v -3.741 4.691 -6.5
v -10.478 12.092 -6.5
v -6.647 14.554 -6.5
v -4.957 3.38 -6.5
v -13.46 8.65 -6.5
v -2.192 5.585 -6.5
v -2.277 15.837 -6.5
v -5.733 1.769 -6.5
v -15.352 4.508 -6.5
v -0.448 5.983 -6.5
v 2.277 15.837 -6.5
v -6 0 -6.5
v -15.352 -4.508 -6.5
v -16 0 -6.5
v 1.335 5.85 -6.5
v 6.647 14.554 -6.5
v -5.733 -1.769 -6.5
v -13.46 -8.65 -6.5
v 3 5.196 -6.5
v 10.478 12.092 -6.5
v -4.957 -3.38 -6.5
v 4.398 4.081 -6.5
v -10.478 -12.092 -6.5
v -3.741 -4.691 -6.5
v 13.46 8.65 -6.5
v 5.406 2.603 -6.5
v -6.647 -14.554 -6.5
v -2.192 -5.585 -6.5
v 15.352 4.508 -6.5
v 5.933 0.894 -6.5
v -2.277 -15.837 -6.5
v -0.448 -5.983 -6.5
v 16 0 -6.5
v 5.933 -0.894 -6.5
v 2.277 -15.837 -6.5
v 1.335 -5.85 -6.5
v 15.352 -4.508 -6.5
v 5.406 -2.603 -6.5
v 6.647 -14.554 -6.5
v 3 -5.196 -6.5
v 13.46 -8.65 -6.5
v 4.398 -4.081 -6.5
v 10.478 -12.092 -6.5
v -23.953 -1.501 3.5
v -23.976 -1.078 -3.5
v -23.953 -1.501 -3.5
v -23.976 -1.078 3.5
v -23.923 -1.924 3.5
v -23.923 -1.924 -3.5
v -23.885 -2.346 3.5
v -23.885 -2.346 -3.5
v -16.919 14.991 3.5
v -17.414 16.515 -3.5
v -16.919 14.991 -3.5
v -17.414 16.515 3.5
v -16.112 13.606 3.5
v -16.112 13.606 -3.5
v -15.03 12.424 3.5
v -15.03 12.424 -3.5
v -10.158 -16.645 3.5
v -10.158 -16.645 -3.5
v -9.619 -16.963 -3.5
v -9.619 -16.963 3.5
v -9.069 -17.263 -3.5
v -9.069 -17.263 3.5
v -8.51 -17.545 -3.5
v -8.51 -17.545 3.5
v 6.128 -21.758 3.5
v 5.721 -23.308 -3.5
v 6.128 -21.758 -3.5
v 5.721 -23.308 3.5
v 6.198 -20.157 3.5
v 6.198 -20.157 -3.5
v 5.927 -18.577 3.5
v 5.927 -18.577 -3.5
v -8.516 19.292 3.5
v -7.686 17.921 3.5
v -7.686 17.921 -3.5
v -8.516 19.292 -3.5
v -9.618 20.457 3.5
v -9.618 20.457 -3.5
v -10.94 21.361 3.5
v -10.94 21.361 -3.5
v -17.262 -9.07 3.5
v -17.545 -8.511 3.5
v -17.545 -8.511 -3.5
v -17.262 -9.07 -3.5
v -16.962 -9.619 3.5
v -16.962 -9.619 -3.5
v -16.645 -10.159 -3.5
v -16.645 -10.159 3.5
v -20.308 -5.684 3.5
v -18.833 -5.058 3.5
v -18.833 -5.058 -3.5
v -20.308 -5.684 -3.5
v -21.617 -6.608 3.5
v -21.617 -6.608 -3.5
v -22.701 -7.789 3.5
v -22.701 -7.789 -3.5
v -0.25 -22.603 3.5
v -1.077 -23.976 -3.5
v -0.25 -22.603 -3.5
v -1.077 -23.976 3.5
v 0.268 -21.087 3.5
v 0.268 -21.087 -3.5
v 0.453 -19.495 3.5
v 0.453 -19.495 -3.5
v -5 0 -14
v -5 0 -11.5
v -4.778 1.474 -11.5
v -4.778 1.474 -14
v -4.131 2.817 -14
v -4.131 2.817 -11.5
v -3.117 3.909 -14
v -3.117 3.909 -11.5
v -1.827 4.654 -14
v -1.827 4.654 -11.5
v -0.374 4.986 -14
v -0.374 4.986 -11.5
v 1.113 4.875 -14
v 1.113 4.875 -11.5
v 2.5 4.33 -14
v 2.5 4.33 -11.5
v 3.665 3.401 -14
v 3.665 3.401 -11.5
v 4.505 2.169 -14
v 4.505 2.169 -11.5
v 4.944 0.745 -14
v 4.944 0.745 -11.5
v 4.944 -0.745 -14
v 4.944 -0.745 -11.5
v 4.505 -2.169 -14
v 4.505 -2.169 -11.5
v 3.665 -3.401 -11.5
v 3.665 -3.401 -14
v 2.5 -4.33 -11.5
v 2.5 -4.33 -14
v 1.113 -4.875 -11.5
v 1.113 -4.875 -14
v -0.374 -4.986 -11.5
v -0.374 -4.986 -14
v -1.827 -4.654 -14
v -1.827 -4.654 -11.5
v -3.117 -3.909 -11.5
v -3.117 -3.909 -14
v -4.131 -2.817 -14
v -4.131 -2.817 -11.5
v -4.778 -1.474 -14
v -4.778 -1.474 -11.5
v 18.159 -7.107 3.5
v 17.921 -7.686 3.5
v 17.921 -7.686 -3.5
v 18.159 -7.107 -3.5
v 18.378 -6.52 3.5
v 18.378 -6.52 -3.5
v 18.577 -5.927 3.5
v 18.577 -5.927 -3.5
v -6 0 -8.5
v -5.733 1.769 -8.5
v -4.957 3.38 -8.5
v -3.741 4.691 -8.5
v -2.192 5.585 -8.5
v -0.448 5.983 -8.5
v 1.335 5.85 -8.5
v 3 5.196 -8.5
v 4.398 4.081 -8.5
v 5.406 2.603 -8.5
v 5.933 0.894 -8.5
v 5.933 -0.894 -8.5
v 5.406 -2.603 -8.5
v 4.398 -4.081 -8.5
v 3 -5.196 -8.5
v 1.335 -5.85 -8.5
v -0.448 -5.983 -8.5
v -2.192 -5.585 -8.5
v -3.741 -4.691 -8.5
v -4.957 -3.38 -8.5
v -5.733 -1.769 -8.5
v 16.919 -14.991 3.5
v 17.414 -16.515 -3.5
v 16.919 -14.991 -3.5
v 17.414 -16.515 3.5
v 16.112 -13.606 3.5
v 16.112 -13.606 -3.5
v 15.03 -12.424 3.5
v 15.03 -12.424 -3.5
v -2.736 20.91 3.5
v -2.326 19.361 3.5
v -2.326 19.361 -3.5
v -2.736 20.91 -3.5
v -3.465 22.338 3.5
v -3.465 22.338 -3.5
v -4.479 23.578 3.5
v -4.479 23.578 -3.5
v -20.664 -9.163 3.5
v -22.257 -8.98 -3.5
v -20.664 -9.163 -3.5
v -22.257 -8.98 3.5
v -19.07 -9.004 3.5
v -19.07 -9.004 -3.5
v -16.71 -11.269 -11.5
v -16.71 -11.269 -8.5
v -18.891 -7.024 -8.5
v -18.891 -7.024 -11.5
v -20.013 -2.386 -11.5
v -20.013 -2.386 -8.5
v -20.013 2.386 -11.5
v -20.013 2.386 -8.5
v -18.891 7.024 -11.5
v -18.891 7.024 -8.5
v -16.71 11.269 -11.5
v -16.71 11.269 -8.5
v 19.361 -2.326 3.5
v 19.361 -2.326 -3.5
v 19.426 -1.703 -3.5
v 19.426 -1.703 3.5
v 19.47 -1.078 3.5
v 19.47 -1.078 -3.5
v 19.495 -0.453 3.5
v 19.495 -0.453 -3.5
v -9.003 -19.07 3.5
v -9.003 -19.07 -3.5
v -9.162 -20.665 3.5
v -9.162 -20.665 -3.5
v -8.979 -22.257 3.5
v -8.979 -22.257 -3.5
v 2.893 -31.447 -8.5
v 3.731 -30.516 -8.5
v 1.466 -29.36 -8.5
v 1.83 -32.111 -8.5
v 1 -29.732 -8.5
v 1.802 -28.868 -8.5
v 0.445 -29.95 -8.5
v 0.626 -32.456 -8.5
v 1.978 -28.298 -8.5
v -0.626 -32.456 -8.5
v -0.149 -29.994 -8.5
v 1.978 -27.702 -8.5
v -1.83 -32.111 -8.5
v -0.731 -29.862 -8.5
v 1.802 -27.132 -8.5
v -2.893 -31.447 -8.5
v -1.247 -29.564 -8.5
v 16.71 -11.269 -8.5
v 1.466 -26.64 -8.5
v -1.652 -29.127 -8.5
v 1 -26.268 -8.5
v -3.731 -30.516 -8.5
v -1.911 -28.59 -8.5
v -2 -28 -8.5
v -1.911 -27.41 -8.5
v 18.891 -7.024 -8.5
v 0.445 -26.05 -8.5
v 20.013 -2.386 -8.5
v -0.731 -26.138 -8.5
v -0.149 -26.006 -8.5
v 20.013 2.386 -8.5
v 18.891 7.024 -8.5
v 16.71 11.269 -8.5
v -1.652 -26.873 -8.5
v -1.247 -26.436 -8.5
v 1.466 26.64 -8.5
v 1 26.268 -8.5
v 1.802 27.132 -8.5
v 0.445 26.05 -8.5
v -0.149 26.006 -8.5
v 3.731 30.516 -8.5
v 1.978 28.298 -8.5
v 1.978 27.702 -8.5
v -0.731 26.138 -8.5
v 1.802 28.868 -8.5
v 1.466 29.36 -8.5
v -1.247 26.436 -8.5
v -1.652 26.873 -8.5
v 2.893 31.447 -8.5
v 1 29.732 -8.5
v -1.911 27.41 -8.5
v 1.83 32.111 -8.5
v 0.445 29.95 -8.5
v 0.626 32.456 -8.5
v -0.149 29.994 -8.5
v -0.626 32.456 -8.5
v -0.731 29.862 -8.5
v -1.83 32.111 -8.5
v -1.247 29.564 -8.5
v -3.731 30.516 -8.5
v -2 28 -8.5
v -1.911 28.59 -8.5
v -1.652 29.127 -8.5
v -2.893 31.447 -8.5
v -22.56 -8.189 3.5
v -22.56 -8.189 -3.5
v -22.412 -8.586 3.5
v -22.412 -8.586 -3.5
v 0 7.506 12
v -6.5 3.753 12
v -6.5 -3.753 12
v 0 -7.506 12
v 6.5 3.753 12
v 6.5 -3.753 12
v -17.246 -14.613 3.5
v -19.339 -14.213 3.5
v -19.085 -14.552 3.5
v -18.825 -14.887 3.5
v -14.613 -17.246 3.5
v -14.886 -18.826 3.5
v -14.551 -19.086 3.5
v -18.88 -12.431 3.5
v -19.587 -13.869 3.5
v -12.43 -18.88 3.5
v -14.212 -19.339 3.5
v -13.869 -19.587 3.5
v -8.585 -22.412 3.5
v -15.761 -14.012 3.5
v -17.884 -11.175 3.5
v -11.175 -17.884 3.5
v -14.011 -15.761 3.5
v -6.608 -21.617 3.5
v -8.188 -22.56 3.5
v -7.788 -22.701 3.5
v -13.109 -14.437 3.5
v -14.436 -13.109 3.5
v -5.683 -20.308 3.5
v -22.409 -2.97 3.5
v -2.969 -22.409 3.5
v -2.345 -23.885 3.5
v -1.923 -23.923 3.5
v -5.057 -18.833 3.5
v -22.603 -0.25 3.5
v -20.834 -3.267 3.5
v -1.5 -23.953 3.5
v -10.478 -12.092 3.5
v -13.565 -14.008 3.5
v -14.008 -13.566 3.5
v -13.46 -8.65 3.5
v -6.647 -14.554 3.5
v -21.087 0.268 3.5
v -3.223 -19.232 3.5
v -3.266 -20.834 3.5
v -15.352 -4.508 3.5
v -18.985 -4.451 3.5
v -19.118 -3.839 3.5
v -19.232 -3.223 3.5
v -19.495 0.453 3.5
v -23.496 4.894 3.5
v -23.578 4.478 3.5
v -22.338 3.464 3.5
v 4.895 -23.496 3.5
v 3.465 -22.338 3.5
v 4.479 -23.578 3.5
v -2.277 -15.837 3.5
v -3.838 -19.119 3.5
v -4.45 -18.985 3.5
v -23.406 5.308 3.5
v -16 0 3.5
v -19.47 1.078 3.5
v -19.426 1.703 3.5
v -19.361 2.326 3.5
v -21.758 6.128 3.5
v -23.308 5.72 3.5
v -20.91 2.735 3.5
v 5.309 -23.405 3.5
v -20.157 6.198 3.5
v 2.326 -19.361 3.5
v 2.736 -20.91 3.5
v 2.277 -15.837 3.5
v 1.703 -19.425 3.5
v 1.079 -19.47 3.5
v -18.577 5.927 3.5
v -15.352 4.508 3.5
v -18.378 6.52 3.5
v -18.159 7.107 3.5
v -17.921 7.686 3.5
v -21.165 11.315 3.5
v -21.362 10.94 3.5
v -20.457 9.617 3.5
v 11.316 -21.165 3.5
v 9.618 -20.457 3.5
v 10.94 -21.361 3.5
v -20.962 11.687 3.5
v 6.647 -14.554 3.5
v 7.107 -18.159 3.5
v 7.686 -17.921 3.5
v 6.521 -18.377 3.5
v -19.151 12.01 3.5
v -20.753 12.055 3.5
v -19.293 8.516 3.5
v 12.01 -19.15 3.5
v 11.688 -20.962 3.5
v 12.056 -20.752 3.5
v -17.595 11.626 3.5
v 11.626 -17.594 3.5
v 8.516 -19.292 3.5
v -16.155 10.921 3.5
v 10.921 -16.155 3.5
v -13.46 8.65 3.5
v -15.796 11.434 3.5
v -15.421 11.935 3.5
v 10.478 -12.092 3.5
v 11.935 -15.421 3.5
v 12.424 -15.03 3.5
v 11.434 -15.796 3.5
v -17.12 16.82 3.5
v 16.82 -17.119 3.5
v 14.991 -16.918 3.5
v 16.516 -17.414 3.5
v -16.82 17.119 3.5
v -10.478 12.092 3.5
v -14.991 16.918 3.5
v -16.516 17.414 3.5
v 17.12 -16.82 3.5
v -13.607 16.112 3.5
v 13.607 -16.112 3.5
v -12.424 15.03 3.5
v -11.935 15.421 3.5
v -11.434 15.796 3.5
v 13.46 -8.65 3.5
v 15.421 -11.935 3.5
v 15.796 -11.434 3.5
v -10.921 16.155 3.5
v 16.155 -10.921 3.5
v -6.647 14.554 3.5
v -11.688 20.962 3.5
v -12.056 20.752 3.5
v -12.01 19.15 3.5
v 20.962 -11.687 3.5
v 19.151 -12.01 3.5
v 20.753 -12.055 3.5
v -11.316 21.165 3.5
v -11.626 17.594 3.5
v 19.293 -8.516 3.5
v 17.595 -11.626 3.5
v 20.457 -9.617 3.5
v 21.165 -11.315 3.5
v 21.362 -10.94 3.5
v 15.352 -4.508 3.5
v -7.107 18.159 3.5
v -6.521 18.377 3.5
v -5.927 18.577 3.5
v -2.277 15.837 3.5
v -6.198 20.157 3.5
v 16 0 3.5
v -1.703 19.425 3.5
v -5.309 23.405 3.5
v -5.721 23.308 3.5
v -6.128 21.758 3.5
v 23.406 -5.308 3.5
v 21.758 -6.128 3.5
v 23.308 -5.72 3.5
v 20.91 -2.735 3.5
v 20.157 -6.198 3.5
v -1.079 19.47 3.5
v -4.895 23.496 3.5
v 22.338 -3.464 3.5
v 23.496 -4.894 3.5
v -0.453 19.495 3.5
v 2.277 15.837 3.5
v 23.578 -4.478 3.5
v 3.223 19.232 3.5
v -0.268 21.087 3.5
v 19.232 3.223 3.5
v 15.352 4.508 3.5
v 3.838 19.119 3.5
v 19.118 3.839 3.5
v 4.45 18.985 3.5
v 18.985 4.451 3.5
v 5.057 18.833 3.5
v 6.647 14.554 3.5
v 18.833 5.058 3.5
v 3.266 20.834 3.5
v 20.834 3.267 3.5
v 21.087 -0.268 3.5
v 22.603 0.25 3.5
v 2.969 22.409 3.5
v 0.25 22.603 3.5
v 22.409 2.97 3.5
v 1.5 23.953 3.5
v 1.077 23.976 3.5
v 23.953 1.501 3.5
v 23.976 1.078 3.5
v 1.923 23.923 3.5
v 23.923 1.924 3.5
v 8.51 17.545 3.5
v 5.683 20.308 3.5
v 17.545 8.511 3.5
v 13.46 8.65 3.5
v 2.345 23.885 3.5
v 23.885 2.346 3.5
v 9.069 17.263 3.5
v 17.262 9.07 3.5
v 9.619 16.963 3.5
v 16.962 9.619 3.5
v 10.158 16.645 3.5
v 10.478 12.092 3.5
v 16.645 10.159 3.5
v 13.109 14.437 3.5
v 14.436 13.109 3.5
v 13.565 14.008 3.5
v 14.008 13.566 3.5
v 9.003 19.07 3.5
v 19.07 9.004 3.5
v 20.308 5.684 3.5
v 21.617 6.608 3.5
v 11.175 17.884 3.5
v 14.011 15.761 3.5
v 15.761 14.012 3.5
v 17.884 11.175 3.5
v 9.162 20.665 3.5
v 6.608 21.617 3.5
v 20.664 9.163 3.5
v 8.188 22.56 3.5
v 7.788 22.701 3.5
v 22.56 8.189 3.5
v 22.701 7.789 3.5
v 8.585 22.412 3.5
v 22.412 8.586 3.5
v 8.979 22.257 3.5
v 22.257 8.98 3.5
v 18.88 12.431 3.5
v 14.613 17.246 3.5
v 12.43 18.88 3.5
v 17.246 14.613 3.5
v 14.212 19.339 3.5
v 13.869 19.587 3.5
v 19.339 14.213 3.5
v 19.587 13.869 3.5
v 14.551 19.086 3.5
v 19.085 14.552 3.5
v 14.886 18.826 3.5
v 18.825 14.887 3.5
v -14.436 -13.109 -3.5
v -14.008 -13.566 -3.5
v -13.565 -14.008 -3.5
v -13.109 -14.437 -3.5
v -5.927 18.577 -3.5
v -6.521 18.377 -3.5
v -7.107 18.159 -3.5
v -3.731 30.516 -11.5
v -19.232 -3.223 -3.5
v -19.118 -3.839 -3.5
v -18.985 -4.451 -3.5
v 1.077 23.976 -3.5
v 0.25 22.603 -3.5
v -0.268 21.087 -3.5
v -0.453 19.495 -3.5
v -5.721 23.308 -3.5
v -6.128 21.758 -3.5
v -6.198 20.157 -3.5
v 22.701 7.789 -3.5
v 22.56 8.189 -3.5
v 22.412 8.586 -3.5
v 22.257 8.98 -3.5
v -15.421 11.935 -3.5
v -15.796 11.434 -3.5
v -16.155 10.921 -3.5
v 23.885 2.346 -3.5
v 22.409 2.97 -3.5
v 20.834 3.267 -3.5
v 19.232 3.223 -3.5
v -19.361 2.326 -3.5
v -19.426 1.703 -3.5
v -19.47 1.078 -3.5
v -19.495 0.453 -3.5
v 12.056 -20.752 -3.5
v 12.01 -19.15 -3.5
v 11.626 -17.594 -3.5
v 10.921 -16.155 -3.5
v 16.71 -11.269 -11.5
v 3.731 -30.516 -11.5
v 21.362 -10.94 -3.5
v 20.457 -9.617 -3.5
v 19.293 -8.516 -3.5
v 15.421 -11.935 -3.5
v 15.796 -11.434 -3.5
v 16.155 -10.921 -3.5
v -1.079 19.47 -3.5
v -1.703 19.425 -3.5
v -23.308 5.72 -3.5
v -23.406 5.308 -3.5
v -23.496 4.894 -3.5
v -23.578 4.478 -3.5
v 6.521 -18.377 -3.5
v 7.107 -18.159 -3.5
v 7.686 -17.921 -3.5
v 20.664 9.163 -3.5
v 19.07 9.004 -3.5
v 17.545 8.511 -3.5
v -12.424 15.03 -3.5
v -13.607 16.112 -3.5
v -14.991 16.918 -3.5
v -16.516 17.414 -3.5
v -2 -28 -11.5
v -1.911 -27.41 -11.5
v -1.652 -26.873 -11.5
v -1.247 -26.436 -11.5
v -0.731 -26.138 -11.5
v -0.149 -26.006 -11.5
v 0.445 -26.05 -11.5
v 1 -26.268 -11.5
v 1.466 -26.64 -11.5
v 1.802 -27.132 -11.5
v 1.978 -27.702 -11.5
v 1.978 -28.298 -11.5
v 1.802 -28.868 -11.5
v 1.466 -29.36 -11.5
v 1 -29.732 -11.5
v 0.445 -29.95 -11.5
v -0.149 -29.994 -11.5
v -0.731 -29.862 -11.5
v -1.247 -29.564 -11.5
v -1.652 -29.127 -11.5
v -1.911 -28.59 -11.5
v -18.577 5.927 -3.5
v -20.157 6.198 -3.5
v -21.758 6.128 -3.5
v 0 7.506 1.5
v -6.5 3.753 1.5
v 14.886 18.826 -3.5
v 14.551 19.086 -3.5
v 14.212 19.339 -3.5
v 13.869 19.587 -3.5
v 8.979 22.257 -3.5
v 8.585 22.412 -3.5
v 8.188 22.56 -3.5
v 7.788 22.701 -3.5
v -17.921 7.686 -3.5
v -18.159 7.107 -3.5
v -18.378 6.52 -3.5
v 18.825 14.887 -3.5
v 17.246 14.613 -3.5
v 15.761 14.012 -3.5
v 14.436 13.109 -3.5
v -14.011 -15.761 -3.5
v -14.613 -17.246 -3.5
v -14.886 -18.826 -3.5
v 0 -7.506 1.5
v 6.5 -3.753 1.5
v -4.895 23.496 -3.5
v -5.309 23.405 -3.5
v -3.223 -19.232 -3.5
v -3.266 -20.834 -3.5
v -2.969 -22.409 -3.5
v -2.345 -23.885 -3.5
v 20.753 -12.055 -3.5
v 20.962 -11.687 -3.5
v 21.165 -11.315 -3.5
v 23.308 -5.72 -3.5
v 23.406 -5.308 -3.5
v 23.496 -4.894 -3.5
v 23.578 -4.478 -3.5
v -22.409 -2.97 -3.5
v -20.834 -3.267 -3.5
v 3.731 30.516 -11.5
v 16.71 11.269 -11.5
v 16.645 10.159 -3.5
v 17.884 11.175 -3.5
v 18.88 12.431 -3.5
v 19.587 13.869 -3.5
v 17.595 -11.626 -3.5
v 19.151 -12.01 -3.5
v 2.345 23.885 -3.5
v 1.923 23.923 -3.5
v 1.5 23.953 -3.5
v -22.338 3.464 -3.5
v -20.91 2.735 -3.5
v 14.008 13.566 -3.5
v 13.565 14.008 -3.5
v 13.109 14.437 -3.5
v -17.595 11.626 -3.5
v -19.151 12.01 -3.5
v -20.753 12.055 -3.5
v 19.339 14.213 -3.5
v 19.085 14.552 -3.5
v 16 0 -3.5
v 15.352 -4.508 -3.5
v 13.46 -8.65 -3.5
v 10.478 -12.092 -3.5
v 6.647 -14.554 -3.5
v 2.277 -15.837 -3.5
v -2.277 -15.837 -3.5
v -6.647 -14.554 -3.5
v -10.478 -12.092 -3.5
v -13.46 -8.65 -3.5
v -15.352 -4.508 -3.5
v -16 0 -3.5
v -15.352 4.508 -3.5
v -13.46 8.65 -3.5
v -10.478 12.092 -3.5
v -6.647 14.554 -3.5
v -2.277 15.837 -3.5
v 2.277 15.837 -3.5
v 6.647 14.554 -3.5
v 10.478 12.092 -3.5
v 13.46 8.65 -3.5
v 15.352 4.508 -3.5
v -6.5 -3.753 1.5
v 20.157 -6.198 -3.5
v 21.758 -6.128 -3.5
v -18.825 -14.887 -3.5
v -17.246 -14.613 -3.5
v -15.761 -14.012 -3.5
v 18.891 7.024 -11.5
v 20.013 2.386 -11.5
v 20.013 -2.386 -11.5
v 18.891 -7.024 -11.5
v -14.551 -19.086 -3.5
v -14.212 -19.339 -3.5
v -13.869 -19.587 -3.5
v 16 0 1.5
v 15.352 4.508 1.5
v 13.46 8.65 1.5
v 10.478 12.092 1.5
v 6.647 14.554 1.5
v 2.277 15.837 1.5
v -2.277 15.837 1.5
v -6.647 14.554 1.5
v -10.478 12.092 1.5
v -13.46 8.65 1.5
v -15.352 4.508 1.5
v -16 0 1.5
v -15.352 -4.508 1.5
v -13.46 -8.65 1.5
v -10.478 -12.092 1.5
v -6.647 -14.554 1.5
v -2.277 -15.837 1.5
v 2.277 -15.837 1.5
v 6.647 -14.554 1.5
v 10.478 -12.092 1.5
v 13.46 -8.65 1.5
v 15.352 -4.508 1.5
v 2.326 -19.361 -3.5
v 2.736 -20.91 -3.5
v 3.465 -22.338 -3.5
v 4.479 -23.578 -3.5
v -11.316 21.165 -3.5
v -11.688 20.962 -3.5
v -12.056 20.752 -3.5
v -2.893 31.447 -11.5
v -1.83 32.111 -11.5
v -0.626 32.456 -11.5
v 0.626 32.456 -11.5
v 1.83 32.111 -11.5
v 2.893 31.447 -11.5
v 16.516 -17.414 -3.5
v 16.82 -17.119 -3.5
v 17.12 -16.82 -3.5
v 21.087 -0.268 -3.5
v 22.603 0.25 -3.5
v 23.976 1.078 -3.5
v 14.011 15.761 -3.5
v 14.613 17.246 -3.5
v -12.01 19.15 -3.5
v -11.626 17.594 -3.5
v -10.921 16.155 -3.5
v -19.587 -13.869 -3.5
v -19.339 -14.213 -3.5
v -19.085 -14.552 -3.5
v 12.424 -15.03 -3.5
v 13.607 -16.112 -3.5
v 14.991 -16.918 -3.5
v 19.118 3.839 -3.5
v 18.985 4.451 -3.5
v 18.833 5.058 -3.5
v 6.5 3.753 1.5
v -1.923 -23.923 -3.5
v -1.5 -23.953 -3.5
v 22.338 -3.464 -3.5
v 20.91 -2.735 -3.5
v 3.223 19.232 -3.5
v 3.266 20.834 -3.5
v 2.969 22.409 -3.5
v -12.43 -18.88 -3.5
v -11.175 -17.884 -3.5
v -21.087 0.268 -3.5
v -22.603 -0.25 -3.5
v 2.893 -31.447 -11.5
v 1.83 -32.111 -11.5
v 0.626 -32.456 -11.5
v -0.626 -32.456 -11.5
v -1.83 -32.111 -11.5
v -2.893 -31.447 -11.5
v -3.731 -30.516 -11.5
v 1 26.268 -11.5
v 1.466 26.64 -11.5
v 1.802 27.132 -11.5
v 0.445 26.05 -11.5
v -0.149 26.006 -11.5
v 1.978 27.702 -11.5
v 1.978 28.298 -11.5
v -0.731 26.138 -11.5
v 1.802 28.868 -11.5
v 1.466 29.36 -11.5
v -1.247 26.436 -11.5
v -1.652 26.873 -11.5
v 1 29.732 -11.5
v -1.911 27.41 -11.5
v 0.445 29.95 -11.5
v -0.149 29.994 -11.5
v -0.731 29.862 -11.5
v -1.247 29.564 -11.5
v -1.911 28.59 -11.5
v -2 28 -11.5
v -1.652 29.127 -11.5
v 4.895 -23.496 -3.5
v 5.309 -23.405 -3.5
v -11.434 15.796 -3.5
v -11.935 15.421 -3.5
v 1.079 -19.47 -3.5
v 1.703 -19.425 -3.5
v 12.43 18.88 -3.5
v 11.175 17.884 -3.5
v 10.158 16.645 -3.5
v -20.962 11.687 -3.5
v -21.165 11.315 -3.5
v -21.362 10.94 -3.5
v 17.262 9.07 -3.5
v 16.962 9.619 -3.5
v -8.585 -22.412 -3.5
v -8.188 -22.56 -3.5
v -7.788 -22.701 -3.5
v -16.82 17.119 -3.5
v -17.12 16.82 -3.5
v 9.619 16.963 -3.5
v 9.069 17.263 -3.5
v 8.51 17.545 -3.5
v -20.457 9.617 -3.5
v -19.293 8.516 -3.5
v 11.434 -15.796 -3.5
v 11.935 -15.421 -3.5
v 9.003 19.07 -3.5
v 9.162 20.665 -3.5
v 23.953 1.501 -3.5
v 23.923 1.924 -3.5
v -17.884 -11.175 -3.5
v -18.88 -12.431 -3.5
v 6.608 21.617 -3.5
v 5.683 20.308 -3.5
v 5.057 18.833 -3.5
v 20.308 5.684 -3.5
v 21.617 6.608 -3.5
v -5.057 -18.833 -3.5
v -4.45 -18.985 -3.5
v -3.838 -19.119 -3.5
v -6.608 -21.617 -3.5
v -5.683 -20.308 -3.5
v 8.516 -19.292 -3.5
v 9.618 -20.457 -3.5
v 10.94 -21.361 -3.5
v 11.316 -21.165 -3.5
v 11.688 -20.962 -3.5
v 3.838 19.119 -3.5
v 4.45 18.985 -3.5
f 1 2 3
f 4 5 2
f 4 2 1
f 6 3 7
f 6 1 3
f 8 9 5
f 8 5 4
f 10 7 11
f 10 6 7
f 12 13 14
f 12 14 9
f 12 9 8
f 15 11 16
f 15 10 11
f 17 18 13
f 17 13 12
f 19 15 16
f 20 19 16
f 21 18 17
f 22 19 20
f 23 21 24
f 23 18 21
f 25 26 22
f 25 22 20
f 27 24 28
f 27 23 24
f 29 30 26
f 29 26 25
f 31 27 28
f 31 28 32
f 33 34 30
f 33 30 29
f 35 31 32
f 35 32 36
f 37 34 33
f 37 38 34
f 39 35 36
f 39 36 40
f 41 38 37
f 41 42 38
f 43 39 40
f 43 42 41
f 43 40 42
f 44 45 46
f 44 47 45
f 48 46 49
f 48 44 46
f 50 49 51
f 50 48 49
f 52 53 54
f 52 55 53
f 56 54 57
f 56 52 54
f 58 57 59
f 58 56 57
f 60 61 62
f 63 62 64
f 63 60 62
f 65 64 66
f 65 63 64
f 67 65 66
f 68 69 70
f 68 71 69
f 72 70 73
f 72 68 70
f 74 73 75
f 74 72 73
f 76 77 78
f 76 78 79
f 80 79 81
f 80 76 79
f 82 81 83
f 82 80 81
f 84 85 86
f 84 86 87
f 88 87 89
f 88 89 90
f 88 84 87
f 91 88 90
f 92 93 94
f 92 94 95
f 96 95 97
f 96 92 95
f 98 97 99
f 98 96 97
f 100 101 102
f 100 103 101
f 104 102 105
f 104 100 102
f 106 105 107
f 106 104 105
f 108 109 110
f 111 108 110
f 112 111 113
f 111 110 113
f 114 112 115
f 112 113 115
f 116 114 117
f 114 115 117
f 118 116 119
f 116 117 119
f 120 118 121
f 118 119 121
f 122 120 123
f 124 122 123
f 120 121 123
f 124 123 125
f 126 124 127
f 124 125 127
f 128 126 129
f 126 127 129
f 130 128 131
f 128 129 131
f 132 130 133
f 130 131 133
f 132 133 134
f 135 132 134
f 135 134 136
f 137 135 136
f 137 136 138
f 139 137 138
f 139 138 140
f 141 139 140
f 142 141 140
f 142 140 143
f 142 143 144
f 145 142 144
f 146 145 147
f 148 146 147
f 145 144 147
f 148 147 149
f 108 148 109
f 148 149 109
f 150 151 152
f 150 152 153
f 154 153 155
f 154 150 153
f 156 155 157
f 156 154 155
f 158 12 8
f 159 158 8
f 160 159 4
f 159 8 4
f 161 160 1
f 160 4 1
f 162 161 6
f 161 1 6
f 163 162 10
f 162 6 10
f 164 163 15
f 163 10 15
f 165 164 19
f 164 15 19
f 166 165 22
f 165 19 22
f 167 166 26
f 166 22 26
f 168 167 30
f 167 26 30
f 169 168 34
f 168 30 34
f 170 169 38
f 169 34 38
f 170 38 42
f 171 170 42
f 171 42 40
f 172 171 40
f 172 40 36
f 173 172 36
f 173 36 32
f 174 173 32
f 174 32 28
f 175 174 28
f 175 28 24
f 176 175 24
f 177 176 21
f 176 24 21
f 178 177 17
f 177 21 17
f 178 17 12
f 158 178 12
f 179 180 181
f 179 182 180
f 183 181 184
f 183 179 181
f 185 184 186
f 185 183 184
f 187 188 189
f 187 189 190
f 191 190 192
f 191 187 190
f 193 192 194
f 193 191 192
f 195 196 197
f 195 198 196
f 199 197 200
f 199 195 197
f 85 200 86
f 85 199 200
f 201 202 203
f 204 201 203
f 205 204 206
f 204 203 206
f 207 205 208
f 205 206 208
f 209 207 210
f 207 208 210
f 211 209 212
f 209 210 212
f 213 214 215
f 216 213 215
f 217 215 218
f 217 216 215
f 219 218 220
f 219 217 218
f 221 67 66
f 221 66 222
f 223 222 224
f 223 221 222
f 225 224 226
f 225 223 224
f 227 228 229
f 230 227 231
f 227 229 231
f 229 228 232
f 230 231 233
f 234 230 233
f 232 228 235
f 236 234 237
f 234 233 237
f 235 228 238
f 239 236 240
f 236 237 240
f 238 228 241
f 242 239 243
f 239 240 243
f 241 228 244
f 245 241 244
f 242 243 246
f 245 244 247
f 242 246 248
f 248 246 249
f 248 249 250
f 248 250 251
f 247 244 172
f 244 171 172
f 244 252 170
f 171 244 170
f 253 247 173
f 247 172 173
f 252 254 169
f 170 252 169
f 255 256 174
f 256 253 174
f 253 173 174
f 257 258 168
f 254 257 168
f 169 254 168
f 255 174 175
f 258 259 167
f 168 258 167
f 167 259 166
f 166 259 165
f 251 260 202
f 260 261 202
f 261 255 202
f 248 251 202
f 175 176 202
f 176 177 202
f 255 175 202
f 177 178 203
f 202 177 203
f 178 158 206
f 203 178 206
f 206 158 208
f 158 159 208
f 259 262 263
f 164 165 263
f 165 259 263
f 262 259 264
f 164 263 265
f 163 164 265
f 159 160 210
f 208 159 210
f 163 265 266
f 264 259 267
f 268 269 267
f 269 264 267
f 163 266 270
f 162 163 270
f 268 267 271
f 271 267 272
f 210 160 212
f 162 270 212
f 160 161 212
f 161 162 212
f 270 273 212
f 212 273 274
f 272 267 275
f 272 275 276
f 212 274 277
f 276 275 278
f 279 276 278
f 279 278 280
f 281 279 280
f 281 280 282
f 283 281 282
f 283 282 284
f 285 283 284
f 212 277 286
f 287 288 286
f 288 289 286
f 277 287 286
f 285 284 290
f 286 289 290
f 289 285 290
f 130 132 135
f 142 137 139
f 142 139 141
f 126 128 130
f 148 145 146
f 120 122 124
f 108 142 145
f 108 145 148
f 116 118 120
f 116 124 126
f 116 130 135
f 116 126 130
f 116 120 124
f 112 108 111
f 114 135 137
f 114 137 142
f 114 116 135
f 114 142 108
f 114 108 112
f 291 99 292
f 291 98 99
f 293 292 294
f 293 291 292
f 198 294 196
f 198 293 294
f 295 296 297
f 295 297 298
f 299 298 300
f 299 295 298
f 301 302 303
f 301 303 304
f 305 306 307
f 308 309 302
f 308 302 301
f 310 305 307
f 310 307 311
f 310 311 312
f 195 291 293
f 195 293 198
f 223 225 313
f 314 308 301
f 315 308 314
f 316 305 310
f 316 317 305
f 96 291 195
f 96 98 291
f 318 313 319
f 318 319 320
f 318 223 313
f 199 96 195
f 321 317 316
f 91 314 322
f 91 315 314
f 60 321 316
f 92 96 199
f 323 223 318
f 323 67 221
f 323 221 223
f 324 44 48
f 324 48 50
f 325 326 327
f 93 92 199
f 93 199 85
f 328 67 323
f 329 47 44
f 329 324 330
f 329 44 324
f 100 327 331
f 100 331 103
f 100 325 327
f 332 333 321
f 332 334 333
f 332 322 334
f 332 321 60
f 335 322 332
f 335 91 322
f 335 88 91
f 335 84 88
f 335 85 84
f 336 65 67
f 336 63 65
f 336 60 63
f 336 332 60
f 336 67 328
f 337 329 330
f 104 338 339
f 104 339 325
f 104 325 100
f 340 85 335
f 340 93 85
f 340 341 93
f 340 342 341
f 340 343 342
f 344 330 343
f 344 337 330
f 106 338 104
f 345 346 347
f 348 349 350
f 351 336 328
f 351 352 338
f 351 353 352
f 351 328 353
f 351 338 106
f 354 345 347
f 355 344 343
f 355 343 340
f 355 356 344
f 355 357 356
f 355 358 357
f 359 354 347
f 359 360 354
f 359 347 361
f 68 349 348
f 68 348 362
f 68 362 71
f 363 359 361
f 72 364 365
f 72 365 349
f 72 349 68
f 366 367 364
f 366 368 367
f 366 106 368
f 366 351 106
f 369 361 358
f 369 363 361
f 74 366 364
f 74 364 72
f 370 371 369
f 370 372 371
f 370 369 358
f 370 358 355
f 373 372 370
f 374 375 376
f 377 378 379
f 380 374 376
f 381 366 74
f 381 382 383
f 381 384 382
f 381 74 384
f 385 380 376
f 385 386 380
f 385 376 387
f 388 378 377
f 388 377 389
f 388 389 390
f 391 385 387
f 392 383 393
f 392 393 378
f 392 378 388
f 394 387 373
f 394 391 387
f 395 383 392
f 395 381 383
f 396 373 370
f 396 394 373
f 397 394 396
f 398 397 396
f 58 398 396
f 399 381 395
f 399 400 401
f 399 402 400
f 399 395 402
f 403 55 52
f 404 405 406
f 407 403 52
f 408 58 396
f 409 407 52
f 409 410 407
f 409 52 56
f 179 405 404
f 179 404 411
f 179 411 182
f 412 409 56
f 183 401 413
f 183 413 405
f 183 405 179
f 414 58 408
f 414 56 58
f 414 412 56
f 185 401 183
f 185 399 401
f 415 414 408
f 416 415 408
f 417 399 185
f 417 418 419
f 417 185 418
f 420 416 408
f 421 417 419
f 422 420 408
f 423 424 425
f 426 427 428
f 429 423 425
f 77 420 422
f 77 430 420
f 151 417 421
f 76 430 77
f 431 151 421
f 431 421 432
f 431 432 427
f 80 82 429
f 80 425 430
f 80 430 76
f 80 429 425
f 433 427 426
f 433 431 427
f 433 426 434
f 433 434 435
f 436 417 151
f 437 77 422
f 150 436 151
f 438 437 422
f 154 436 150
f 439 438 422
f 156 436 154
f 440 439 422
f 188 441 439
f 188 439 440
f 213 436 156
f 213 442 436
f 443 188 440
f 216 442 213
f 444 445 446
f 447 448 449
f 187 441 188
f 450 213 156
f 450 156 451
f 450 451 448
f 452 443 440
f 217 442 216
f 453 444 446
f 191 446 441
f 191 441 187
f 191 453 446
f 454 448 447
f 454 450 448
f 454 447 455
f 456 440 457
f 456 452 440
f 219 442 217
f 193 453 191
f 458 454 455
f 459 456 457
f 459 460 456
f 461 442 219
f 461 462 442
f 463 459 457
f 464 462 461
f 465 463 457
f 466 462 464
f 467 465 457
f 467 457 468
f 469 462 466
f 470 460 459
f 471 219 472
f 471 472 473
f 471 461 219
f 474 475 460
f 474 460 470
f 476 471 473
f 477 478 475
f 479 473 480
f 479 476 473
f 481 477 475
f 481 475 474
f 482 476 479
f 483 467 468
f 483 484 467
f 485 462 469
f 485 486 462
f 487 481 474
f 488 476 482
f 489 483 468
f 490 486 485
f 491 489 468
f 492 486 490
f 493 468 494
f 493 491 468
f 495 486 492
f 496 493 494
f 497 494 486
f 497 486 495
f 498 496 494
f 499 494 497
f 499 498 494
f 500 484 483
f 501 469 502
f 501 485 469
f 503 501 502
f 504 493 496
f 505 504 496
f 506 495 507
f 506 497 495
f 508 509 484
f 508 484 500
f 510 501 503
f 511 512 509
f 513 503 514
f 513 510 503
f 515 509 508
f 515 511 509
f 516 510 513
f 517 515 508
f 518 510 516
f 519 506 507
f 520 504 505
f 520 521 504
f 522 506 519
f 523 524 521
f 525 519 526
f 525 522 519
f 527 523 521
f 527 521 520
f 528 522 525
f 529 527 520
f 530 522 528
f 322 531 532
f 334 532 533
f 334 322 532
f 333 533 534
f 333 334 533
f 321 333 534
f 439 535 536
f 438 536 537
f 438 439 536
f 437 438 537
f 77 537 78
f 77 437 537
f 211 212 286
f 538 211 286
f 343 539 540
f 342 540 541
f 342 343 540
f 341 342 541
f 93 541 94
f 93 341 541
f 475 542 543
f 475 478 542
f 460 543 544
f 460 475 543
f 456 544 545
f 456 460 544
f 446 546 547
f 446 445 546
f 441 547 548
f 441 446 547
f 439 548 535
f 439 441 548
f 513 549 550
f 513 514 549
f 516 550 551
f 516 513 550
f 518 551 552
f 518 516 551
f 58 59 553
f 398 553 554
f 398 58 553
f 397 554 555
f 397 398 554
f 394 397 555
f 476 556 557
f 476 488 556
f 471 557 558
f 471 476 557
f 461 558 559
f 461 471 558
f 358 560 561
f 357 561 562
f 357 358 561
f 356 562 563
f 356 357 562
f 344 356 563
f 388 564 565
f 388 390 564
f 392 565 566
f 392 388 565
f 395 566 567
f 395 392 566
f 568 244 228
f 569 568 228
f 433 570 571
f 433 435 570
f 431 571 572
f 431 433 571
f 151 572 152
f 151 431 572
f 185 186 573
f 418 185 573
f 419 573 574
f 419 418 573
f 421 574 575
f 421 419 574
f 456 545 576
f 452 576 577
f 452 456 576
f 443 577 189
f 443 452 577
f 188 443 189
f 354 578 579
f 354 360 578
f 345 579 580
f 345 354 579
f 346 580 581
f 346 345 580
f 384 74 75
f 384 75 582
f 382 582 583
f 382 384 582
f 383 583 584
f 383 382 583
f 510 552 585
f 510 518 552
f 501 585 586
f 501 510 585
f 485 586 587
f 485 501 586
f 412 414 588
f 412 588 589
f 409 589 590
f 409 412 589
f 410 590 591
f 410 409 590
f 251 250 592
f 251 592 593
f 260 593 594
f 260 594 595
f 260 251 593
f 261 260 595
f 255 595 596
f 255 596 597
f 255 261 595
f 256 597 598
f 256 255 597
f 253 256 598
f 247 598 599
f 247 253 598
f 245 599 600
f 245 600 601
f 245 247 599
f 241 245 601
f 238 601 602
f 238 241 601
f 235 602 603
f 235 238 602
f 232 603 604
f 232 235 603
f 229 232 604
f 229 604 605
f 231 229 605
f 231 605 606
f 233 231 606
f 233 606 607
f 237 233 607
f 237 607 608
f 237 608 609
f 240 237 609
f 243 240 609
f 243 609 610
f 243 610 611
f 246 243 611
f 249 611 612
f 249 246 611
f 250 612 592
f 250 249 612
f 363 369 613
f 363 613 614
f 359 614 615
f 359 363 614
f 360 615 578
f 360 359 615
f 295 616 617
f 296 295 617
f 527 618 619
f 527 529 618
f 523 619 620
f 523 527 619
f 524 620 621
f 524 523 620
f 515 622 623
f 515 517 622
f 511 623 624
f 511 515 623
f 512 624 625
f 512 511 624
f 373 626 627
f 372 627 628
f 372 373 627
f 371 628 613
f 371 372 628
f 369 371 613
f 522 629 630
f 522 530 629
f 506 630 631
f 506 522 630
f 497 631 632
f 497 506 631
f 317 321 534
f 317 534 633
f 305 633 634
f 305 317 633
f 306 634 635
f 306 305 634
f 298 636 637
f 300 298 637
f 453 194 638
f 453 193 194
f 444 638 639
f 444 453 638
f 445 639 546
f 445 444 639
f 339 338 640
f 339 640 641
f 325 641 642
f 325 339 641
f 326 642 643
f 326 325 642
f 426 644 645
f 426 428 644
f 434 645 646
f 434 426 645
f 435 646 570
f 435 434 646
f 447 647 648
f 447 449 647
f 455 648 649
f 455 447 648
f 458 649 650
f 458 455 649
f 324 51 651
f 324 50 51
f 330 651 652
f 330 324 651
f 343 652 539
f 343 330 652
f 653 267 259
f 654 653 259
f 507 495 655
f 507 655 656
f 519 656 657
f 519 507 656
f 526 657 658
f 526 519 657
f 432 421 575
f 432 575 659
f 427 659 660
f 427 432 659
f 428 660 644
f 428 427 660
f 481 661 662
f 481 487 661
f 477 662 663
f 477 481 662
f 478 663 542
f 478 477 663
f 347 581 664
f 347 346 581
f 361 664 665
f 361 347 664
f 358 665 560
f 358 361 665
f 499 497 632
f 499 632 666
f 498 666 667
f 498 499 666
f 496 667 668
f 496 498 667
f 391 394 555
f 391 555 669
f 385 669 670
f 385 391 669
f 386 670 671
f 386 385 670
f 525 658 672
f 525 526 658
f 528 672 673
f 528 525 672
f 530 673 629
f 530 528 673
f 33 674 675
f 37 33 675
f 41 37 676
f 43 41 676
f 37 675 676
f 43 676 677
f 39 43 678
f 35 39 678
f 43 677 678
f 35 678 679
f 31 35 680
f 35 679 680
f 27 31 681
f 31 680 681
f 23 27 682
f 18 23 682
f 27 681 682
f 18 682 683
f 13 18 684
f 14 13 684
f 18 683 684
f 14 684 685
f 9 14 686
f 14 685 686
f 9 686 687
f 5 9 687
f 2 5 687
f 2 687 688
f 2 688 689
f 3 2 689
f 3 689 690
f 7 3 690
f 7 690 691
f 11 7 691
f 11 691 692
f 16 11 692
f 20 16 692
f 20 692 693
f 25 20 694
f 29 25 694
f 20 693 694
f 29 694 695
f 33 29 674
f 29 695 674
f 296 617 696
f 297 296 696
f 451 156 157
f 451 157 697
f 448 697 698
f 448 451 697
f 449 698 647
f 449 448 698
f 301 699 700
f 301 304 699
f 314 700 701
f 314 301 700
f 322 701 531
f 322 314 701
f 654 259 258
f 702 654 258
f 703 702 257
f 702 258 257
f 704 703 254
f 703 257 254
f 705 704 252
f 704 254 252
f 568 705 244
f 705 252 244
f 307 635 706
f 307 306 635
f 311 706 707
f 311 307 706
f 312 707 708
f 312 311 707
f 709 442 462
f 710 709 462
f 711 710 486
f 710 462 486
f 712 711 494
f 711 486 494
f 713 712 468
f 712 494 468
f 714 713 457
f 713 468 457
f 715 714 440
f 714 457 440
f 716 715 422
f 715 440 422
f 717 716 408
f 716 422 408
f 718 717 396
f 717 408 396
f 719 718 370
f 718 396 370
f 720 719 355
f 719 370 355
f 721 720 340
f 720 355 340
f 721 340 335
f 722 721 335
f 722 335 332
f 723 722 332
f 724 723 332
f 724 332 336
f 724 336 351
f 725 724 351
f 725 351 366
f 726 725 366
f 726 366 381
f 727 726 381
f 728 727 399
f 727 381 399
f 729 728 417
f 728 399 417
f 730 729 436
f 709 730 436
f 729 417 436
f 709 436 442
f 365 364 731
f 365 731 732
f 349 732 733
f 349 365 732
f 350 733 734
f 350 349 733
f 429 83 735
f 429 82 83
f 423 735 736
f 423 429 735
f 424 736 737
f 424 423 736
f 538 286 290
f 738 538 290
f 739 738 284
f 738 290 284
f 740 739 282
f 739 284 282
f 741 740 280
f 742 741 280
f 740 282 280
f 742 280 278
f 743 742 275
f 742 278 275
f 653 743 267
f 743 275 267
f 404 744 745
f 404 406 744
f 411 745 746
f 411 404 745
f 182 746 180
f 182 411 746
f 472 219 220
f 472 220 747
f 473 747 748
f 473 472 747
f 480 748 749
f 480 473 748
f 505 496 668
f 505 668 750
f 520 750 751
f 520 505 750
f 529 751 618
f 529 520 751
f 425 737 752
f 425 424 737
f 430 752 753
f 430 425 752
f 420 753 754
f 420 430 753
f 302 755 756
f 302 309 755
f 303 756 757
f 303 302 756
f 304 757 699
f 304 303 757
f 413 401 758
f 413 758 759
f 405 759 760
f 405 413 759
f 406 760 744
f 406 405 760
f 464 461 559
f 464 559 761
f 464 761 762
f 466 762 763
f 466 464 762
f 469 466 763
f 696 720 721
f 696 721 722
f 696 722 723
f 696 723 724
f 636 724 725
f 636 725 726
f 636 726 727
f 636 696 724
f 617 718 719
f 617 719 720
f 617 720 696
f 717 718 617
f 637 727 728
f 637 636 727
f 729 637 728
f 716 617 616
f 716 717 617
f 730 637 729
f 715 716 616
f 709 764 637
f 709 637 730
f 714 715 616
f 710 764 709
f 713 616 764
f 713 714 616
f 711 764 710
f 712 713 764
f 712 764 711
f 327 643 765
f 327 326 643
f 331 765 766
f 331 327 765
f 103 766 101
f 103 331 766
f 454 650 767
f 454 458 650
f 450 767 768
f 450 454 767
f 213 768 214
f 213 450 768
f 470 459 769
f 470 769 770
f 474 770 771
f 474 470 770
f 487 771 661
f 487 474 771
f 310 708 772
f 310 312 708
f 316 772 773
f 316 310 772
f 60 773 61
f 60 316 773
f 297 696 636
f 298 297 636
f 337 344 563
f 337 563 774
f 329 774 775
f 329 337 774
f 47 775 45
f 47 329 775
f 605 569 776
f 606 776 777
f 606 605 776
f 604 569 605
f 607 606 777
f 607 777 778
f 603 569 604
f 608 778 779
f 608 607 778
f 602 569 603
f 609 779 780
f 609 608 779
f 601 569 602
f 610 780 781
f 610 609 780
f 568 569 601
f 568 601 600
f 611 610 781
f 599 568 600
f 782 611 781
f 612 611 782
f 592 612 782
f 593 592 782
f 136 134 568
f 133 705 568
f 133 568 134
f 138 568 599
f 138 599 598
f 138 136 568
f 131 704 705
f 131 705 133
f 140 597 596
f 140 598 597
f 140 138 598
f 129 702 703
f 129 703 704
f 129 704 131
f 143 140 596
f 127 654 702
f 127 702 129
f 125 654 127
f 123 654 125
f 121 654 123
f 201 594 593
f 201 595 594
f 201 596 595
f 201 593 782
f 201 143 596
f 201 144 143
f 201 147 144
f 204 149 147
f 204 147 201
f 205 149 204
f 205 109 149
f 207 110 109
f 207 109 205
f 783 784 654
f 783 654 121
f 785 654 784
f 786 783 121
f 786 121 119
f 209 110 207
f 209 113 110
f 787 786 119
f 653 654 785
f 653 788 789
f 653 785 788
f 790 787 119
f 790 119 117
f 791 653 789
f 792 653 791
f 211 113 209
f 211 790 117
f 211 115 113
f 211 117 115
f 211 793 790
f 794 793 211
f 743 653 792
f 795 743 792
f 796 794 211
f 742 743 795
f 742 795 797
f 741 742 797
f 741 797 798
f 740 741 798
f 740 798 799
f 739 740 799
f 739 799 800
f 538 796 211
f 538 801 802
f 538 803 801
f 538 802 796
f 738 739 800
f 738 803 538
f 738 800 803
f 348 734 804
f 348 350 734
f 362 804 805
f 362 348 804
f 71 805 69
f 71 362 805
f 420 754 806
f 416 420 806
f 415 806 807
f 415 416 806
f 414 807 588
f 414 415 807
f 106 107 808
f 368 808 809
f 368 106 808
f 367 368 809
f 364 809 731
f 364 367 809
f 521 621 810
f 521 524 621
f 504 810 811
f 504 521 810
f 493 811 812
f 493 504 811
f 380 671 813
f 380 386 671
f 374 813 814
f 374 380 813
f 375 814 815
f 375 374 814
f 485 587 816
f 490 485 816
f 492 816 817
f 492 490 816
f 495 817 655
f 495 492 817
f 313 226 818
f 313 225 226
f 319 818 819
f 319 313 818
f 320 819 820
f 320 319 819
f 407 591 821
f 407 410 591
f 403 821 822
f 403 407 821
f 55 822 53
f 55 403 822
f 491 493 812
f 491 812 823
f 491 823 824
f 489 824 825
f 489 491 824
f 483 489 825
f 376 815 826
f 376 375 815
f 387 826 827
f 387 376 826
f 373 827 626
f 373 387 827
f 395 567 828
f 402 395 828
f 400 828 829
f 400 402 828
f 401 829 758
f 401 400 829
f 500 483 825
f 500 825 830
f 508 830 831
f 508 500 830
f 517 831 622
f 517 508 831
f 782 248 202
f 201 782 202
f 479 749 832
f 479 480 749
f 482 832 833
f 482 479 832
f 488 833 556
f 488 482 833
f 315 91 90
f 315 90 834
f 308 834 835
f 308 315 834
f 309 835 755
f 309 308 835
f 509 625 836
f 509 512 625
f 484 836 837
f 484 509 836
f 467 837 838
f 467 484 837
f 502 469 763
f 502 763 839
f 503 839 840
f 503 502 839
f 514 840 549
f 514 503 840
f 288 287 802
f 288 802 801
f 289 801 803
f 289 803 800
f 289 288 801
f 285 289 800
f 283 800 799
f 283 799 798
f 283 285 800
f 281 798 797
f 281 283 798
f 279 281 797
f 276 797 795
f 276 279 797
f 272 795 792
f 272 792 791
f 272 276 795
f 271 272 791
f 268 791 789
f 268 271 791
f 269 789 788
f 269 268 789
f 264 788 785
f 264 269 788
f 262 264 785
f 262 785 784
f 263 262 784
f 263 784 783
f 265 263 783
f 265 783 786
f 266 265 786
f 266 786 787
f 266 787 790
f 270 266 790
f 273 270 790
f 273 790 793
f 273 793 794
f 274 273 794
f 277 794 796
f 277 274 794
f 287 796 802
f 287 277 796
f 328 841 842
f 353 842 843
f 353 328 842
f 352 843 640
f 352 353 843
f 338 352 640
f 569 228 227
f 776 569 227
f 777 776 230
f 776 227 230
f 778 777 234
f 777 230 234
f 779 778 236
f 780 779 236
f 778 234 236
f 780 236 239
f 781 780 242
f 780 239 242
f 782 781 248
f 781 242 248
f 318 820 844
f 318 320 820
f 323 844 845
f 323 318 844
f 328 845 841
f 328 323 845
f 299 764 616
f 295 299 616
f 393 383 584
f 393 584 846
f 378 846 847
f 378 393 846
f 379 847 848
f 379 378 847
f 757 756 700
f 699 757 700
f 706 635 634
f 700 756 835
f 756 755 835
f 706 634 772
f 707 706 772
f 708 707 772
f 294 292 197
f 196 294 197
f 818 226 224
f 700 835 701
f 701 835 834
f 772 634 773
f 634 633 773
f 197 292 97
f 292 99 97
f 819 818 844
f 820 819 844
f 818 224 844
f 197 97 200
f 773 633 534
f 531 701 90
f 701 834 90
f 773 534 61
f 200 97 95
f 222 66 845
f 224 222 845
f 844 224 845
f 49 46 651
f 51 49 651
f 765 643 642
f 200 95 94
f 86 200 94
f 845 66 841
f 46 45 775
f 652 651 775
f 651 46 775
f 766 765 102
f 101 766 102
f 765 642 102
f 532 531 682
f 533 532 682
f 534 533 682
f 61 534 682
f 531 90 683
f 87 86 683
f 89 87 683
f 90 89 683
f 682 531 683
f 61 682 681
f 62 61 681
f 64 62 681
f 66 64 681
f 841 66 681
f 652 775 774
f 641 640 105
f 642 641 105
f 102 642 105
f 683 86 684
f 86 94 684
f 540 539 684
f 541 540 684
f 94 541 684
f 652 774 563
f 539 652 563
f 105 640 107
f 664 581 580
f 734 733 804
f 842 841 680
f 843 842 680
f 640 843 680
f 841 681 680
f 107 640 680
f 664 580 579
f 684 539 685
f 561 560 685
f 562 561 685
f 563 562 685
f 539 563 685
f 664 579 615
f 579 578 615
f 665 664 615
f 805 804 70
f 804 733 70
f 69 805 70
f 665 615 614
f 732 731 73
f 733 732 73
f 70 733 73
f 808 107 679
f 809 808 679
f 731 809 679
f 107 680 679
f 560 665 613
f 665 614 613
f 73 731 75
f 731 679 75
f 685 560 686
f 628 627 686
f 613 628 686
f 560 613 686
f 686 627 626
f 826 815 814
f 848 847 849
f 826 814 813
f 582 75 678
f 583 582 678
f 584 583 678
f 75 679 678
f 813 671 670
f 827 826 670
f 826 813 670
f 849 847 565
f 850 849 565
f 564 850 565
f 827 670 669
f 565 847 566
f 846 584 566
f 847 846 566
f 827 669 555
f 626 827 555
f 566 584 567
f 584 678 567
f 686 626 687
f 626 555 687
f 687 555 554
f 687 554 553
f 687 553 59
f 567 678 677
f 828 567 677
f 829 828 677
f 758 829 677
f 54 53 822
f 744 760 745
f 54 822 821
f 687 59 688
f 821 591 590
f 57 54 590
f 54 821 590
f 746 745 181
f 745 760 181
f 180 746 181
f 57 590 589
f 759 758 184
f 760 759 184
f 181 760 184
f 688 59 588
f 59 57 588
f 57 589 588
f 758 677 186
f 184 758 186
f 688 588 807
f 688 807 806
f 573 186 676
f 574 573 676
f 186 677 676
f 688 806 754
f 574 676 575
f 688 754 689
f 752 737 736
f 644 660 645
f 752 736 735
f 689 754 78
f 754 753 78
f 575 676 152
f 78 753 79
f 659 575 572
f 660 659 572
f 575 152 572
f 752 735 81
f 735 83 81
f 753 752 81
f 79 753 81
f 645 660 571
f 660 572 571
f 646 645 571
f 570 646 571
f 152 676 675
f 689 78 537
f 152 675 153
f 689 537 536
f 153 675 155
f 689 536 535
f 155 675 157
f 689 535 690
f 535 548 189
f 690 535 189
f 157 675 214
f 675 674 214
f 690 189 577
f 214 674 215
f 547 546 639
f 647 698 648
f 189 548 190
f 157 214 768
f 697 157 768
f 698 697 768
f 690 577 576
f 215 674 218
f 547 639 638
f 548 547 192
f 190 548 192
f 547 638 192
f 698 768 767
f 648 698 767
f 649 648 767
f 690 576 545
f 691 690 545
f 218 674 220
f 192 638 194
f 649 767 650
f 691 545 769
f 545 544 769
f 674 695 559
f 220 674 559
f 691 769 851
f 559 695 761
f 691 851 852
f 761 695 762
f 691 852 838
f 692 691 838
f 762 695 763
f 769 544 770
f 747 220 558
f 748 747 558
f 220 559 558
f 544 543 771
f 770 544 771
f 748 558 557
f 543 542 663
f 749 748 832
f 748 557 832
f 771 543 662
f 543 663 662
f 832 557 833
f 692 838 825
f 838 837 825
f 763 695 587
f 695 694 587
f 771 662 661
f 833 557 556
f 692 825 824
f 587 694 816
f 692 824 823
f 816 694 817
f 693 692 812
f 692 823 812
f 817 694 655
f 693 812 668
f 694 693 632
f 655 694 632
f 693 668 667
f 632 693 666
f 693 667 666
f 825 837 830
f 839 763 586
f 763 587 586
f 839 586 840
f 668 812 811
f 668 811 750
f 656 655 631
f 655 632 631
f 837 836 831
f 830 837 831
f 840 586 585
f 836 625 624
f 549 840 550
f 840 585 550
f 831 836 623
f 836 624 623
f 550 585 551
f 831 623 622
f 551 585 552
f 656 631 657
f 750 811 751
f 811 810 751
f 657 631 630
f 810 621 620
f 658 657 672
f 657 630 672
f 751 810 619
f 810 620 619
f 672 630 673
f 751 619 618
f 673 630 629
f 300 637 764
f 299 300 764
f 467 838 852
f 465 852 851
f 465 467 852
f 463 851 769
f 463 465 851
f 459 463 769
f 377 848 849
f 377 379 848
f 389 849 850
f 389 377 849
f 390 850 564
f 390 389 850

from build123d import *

# Parameters (mm, degrees)
EXTRUDE_1_DEPTH          = 3.5
SKETCH_2_R               = 19.5
EXTRUDE_2_DEPTH          = 7
PATTERN_CIRCULAR_1_COUNT = 22
SKETCH_3_R               = 16
CUT_EXTRUDE_1_DEPTH      = 2
SKETCH_4_R               = 16
EXTRUDE_3_DEPTH          = 3
SKETCH_5_R               = 6
EXTRUDE_4_DEPTH          = 2
SKETCH_6_R               = 2
EXTRUDE_5_DEPTH          = 3
SKETCH_7_R               = 5
EXTRUDE_6_DEPTH          = 2.5
EXTRUDE_7_DEPTH          = 10.5


with BuildPart() as part:
    # 草图1 → 凸台-拉伸1 (new, symmetric)
    with BuildSketch(Plane.XY):
        with BuildLine():
            ThreePointArc((1.077257951, 23.975811046), (-0.049799614, 21.8588225), (-0.453470023, 19.494726593))
            ThreePointArc((-0.453470023, 19.494726593), (1.390805461, 19.450338305), (3.222632926, 19.231865147))
            ThreePointArc((3.222632926, 19.231865147), (3.159441147, 21.629344251), (2.3450627, 23.885156079))
            ThreePointArc((2.3450627, 23.885156079), (1.711760568, 23.938877914), (1.077257951, 23.975811046))
        make_face()
    extrude_1 = extrude(amount=EXTRUDE_1_DEPTH, both=True)

    # 草图2 → 凸台-拉伸2 (add)
    with BuildSketch(Plane.XY.offset(3.5)):
        Circle(SKETCH_2_R)
    extrude(amount=-EXTRUDE_2_DEPTH)

    # 阵列(圆周)1: 凸台-拉伸1 ×22 about axis
    pattern_circular_1_axis = Axis((0, 0, 0), (0, 0, 1))
    for i in range(1, PATTERN_CIRCULAR_1_COUNT):
        add(extrude_1.rotate(pattern_circular_1_axis, i * 360 / PATTERN_CIRCULAR_1_COUNT))

    # 草图3 → 切除-拉伸1 (cut)
    with BuildSketch(Plane.XY.offset(3.5)):
        Circle(SKETCH_3_R)
    extrude(amount=-CUT_EXTRUDE_1_DEPTH, mode=Mode.SUBTRACT)

    # 草图4 → 凸台-拉伸3 (add)
    with BuildSketch(Plane(origin=(0, 0, -3.5), x_dir=(-1, 0, 0), z_dir=(0, 0, -1))):
        with Locations(Location((0, 0, 0), (0, 0, 180))):
            Circle(SKETCH_4_R)
    extrude(amount=EXTRUDE_3_DEPTH)

    # 草图5 → 凸台-拉伸4 (add)
    with BuildSketch(Plane(origin=(0, 0, -6.5), x_dir=(-1, 0, 0), z_dir=(0, 0, -1))):
        Circle(SKETCH_5_R)
    extrude(amount=EXTRUDE_4_DEPTH)

    # 草图6 → 凸台-拉伸5 (add)
    with BuildSketch(Plane(origin=(0, 0, -8.5), x_dir=(-1, 0, 0), z_dir=(0, 0, -1))):
        with BuildLine():
            Line((-3.730929356, 30.515982143), (-16.710418036, 11.268804464))
            ThreePointArc((-16.710418036, 11.268804464), (-20.155, 0), (-16.710418036, -11.268804464))
            Line((-16.710418036, -11.268804464), (-3.730929356, -30.515982143))
            ThreePointArc((-3.730929356, -30.515982143), (0, -32.5), (3.730929356, -30.515982143))
            Line((3.730929356, -30.515982143), (16.710418036, -11.268804464))
            ThreePointArc((16.710418036, -11.268804464), (20.155, 0), (16.710418036, 11.268804464))
            Line((16.710418036, 11.268804464), (3.730929356, 30.515982143))
            ThreePointArc((3.730929356, 30.515982143), (0, 32.5), (-3.730929356, 30.515982143))
        make_face()
        with Locations((0, 28)):
            Circle(SKETCH_6_R, mode=Mode.SUBTRACT)
        with Locations((0, -28)):
            Circle(SKETCH_6_R, mode=Mode.SUBTRACT)
    extrude(amount=EXTRUDE_5_DEPTH)

    # 草图7 → 凸台-拉伸6 (add)
    with BuildSketch(Plane(origin=(0, 0, -11.5), x_dir=(-1, 0, 0), z_dir=(0, 0, -1))):
        Circle(SKETCH_7_R)
    extrude(amount=EXTRUDE_6_DEPTH)

    # 草图8 → 凸台-拉伸7 (add)
    with BuildSketch(Plane.XY.offset(1.5)):
        Polygon((0, 7.505553499), (-6.5, 3.75277675), (-6.5, -3.75277675), (0, -7.505553499), (6.5, -3.75277675), (6.5, 3.75277675), align=None)
    extrude(amount=EXTRUDE_7_DEPTH)


solid = part.part
